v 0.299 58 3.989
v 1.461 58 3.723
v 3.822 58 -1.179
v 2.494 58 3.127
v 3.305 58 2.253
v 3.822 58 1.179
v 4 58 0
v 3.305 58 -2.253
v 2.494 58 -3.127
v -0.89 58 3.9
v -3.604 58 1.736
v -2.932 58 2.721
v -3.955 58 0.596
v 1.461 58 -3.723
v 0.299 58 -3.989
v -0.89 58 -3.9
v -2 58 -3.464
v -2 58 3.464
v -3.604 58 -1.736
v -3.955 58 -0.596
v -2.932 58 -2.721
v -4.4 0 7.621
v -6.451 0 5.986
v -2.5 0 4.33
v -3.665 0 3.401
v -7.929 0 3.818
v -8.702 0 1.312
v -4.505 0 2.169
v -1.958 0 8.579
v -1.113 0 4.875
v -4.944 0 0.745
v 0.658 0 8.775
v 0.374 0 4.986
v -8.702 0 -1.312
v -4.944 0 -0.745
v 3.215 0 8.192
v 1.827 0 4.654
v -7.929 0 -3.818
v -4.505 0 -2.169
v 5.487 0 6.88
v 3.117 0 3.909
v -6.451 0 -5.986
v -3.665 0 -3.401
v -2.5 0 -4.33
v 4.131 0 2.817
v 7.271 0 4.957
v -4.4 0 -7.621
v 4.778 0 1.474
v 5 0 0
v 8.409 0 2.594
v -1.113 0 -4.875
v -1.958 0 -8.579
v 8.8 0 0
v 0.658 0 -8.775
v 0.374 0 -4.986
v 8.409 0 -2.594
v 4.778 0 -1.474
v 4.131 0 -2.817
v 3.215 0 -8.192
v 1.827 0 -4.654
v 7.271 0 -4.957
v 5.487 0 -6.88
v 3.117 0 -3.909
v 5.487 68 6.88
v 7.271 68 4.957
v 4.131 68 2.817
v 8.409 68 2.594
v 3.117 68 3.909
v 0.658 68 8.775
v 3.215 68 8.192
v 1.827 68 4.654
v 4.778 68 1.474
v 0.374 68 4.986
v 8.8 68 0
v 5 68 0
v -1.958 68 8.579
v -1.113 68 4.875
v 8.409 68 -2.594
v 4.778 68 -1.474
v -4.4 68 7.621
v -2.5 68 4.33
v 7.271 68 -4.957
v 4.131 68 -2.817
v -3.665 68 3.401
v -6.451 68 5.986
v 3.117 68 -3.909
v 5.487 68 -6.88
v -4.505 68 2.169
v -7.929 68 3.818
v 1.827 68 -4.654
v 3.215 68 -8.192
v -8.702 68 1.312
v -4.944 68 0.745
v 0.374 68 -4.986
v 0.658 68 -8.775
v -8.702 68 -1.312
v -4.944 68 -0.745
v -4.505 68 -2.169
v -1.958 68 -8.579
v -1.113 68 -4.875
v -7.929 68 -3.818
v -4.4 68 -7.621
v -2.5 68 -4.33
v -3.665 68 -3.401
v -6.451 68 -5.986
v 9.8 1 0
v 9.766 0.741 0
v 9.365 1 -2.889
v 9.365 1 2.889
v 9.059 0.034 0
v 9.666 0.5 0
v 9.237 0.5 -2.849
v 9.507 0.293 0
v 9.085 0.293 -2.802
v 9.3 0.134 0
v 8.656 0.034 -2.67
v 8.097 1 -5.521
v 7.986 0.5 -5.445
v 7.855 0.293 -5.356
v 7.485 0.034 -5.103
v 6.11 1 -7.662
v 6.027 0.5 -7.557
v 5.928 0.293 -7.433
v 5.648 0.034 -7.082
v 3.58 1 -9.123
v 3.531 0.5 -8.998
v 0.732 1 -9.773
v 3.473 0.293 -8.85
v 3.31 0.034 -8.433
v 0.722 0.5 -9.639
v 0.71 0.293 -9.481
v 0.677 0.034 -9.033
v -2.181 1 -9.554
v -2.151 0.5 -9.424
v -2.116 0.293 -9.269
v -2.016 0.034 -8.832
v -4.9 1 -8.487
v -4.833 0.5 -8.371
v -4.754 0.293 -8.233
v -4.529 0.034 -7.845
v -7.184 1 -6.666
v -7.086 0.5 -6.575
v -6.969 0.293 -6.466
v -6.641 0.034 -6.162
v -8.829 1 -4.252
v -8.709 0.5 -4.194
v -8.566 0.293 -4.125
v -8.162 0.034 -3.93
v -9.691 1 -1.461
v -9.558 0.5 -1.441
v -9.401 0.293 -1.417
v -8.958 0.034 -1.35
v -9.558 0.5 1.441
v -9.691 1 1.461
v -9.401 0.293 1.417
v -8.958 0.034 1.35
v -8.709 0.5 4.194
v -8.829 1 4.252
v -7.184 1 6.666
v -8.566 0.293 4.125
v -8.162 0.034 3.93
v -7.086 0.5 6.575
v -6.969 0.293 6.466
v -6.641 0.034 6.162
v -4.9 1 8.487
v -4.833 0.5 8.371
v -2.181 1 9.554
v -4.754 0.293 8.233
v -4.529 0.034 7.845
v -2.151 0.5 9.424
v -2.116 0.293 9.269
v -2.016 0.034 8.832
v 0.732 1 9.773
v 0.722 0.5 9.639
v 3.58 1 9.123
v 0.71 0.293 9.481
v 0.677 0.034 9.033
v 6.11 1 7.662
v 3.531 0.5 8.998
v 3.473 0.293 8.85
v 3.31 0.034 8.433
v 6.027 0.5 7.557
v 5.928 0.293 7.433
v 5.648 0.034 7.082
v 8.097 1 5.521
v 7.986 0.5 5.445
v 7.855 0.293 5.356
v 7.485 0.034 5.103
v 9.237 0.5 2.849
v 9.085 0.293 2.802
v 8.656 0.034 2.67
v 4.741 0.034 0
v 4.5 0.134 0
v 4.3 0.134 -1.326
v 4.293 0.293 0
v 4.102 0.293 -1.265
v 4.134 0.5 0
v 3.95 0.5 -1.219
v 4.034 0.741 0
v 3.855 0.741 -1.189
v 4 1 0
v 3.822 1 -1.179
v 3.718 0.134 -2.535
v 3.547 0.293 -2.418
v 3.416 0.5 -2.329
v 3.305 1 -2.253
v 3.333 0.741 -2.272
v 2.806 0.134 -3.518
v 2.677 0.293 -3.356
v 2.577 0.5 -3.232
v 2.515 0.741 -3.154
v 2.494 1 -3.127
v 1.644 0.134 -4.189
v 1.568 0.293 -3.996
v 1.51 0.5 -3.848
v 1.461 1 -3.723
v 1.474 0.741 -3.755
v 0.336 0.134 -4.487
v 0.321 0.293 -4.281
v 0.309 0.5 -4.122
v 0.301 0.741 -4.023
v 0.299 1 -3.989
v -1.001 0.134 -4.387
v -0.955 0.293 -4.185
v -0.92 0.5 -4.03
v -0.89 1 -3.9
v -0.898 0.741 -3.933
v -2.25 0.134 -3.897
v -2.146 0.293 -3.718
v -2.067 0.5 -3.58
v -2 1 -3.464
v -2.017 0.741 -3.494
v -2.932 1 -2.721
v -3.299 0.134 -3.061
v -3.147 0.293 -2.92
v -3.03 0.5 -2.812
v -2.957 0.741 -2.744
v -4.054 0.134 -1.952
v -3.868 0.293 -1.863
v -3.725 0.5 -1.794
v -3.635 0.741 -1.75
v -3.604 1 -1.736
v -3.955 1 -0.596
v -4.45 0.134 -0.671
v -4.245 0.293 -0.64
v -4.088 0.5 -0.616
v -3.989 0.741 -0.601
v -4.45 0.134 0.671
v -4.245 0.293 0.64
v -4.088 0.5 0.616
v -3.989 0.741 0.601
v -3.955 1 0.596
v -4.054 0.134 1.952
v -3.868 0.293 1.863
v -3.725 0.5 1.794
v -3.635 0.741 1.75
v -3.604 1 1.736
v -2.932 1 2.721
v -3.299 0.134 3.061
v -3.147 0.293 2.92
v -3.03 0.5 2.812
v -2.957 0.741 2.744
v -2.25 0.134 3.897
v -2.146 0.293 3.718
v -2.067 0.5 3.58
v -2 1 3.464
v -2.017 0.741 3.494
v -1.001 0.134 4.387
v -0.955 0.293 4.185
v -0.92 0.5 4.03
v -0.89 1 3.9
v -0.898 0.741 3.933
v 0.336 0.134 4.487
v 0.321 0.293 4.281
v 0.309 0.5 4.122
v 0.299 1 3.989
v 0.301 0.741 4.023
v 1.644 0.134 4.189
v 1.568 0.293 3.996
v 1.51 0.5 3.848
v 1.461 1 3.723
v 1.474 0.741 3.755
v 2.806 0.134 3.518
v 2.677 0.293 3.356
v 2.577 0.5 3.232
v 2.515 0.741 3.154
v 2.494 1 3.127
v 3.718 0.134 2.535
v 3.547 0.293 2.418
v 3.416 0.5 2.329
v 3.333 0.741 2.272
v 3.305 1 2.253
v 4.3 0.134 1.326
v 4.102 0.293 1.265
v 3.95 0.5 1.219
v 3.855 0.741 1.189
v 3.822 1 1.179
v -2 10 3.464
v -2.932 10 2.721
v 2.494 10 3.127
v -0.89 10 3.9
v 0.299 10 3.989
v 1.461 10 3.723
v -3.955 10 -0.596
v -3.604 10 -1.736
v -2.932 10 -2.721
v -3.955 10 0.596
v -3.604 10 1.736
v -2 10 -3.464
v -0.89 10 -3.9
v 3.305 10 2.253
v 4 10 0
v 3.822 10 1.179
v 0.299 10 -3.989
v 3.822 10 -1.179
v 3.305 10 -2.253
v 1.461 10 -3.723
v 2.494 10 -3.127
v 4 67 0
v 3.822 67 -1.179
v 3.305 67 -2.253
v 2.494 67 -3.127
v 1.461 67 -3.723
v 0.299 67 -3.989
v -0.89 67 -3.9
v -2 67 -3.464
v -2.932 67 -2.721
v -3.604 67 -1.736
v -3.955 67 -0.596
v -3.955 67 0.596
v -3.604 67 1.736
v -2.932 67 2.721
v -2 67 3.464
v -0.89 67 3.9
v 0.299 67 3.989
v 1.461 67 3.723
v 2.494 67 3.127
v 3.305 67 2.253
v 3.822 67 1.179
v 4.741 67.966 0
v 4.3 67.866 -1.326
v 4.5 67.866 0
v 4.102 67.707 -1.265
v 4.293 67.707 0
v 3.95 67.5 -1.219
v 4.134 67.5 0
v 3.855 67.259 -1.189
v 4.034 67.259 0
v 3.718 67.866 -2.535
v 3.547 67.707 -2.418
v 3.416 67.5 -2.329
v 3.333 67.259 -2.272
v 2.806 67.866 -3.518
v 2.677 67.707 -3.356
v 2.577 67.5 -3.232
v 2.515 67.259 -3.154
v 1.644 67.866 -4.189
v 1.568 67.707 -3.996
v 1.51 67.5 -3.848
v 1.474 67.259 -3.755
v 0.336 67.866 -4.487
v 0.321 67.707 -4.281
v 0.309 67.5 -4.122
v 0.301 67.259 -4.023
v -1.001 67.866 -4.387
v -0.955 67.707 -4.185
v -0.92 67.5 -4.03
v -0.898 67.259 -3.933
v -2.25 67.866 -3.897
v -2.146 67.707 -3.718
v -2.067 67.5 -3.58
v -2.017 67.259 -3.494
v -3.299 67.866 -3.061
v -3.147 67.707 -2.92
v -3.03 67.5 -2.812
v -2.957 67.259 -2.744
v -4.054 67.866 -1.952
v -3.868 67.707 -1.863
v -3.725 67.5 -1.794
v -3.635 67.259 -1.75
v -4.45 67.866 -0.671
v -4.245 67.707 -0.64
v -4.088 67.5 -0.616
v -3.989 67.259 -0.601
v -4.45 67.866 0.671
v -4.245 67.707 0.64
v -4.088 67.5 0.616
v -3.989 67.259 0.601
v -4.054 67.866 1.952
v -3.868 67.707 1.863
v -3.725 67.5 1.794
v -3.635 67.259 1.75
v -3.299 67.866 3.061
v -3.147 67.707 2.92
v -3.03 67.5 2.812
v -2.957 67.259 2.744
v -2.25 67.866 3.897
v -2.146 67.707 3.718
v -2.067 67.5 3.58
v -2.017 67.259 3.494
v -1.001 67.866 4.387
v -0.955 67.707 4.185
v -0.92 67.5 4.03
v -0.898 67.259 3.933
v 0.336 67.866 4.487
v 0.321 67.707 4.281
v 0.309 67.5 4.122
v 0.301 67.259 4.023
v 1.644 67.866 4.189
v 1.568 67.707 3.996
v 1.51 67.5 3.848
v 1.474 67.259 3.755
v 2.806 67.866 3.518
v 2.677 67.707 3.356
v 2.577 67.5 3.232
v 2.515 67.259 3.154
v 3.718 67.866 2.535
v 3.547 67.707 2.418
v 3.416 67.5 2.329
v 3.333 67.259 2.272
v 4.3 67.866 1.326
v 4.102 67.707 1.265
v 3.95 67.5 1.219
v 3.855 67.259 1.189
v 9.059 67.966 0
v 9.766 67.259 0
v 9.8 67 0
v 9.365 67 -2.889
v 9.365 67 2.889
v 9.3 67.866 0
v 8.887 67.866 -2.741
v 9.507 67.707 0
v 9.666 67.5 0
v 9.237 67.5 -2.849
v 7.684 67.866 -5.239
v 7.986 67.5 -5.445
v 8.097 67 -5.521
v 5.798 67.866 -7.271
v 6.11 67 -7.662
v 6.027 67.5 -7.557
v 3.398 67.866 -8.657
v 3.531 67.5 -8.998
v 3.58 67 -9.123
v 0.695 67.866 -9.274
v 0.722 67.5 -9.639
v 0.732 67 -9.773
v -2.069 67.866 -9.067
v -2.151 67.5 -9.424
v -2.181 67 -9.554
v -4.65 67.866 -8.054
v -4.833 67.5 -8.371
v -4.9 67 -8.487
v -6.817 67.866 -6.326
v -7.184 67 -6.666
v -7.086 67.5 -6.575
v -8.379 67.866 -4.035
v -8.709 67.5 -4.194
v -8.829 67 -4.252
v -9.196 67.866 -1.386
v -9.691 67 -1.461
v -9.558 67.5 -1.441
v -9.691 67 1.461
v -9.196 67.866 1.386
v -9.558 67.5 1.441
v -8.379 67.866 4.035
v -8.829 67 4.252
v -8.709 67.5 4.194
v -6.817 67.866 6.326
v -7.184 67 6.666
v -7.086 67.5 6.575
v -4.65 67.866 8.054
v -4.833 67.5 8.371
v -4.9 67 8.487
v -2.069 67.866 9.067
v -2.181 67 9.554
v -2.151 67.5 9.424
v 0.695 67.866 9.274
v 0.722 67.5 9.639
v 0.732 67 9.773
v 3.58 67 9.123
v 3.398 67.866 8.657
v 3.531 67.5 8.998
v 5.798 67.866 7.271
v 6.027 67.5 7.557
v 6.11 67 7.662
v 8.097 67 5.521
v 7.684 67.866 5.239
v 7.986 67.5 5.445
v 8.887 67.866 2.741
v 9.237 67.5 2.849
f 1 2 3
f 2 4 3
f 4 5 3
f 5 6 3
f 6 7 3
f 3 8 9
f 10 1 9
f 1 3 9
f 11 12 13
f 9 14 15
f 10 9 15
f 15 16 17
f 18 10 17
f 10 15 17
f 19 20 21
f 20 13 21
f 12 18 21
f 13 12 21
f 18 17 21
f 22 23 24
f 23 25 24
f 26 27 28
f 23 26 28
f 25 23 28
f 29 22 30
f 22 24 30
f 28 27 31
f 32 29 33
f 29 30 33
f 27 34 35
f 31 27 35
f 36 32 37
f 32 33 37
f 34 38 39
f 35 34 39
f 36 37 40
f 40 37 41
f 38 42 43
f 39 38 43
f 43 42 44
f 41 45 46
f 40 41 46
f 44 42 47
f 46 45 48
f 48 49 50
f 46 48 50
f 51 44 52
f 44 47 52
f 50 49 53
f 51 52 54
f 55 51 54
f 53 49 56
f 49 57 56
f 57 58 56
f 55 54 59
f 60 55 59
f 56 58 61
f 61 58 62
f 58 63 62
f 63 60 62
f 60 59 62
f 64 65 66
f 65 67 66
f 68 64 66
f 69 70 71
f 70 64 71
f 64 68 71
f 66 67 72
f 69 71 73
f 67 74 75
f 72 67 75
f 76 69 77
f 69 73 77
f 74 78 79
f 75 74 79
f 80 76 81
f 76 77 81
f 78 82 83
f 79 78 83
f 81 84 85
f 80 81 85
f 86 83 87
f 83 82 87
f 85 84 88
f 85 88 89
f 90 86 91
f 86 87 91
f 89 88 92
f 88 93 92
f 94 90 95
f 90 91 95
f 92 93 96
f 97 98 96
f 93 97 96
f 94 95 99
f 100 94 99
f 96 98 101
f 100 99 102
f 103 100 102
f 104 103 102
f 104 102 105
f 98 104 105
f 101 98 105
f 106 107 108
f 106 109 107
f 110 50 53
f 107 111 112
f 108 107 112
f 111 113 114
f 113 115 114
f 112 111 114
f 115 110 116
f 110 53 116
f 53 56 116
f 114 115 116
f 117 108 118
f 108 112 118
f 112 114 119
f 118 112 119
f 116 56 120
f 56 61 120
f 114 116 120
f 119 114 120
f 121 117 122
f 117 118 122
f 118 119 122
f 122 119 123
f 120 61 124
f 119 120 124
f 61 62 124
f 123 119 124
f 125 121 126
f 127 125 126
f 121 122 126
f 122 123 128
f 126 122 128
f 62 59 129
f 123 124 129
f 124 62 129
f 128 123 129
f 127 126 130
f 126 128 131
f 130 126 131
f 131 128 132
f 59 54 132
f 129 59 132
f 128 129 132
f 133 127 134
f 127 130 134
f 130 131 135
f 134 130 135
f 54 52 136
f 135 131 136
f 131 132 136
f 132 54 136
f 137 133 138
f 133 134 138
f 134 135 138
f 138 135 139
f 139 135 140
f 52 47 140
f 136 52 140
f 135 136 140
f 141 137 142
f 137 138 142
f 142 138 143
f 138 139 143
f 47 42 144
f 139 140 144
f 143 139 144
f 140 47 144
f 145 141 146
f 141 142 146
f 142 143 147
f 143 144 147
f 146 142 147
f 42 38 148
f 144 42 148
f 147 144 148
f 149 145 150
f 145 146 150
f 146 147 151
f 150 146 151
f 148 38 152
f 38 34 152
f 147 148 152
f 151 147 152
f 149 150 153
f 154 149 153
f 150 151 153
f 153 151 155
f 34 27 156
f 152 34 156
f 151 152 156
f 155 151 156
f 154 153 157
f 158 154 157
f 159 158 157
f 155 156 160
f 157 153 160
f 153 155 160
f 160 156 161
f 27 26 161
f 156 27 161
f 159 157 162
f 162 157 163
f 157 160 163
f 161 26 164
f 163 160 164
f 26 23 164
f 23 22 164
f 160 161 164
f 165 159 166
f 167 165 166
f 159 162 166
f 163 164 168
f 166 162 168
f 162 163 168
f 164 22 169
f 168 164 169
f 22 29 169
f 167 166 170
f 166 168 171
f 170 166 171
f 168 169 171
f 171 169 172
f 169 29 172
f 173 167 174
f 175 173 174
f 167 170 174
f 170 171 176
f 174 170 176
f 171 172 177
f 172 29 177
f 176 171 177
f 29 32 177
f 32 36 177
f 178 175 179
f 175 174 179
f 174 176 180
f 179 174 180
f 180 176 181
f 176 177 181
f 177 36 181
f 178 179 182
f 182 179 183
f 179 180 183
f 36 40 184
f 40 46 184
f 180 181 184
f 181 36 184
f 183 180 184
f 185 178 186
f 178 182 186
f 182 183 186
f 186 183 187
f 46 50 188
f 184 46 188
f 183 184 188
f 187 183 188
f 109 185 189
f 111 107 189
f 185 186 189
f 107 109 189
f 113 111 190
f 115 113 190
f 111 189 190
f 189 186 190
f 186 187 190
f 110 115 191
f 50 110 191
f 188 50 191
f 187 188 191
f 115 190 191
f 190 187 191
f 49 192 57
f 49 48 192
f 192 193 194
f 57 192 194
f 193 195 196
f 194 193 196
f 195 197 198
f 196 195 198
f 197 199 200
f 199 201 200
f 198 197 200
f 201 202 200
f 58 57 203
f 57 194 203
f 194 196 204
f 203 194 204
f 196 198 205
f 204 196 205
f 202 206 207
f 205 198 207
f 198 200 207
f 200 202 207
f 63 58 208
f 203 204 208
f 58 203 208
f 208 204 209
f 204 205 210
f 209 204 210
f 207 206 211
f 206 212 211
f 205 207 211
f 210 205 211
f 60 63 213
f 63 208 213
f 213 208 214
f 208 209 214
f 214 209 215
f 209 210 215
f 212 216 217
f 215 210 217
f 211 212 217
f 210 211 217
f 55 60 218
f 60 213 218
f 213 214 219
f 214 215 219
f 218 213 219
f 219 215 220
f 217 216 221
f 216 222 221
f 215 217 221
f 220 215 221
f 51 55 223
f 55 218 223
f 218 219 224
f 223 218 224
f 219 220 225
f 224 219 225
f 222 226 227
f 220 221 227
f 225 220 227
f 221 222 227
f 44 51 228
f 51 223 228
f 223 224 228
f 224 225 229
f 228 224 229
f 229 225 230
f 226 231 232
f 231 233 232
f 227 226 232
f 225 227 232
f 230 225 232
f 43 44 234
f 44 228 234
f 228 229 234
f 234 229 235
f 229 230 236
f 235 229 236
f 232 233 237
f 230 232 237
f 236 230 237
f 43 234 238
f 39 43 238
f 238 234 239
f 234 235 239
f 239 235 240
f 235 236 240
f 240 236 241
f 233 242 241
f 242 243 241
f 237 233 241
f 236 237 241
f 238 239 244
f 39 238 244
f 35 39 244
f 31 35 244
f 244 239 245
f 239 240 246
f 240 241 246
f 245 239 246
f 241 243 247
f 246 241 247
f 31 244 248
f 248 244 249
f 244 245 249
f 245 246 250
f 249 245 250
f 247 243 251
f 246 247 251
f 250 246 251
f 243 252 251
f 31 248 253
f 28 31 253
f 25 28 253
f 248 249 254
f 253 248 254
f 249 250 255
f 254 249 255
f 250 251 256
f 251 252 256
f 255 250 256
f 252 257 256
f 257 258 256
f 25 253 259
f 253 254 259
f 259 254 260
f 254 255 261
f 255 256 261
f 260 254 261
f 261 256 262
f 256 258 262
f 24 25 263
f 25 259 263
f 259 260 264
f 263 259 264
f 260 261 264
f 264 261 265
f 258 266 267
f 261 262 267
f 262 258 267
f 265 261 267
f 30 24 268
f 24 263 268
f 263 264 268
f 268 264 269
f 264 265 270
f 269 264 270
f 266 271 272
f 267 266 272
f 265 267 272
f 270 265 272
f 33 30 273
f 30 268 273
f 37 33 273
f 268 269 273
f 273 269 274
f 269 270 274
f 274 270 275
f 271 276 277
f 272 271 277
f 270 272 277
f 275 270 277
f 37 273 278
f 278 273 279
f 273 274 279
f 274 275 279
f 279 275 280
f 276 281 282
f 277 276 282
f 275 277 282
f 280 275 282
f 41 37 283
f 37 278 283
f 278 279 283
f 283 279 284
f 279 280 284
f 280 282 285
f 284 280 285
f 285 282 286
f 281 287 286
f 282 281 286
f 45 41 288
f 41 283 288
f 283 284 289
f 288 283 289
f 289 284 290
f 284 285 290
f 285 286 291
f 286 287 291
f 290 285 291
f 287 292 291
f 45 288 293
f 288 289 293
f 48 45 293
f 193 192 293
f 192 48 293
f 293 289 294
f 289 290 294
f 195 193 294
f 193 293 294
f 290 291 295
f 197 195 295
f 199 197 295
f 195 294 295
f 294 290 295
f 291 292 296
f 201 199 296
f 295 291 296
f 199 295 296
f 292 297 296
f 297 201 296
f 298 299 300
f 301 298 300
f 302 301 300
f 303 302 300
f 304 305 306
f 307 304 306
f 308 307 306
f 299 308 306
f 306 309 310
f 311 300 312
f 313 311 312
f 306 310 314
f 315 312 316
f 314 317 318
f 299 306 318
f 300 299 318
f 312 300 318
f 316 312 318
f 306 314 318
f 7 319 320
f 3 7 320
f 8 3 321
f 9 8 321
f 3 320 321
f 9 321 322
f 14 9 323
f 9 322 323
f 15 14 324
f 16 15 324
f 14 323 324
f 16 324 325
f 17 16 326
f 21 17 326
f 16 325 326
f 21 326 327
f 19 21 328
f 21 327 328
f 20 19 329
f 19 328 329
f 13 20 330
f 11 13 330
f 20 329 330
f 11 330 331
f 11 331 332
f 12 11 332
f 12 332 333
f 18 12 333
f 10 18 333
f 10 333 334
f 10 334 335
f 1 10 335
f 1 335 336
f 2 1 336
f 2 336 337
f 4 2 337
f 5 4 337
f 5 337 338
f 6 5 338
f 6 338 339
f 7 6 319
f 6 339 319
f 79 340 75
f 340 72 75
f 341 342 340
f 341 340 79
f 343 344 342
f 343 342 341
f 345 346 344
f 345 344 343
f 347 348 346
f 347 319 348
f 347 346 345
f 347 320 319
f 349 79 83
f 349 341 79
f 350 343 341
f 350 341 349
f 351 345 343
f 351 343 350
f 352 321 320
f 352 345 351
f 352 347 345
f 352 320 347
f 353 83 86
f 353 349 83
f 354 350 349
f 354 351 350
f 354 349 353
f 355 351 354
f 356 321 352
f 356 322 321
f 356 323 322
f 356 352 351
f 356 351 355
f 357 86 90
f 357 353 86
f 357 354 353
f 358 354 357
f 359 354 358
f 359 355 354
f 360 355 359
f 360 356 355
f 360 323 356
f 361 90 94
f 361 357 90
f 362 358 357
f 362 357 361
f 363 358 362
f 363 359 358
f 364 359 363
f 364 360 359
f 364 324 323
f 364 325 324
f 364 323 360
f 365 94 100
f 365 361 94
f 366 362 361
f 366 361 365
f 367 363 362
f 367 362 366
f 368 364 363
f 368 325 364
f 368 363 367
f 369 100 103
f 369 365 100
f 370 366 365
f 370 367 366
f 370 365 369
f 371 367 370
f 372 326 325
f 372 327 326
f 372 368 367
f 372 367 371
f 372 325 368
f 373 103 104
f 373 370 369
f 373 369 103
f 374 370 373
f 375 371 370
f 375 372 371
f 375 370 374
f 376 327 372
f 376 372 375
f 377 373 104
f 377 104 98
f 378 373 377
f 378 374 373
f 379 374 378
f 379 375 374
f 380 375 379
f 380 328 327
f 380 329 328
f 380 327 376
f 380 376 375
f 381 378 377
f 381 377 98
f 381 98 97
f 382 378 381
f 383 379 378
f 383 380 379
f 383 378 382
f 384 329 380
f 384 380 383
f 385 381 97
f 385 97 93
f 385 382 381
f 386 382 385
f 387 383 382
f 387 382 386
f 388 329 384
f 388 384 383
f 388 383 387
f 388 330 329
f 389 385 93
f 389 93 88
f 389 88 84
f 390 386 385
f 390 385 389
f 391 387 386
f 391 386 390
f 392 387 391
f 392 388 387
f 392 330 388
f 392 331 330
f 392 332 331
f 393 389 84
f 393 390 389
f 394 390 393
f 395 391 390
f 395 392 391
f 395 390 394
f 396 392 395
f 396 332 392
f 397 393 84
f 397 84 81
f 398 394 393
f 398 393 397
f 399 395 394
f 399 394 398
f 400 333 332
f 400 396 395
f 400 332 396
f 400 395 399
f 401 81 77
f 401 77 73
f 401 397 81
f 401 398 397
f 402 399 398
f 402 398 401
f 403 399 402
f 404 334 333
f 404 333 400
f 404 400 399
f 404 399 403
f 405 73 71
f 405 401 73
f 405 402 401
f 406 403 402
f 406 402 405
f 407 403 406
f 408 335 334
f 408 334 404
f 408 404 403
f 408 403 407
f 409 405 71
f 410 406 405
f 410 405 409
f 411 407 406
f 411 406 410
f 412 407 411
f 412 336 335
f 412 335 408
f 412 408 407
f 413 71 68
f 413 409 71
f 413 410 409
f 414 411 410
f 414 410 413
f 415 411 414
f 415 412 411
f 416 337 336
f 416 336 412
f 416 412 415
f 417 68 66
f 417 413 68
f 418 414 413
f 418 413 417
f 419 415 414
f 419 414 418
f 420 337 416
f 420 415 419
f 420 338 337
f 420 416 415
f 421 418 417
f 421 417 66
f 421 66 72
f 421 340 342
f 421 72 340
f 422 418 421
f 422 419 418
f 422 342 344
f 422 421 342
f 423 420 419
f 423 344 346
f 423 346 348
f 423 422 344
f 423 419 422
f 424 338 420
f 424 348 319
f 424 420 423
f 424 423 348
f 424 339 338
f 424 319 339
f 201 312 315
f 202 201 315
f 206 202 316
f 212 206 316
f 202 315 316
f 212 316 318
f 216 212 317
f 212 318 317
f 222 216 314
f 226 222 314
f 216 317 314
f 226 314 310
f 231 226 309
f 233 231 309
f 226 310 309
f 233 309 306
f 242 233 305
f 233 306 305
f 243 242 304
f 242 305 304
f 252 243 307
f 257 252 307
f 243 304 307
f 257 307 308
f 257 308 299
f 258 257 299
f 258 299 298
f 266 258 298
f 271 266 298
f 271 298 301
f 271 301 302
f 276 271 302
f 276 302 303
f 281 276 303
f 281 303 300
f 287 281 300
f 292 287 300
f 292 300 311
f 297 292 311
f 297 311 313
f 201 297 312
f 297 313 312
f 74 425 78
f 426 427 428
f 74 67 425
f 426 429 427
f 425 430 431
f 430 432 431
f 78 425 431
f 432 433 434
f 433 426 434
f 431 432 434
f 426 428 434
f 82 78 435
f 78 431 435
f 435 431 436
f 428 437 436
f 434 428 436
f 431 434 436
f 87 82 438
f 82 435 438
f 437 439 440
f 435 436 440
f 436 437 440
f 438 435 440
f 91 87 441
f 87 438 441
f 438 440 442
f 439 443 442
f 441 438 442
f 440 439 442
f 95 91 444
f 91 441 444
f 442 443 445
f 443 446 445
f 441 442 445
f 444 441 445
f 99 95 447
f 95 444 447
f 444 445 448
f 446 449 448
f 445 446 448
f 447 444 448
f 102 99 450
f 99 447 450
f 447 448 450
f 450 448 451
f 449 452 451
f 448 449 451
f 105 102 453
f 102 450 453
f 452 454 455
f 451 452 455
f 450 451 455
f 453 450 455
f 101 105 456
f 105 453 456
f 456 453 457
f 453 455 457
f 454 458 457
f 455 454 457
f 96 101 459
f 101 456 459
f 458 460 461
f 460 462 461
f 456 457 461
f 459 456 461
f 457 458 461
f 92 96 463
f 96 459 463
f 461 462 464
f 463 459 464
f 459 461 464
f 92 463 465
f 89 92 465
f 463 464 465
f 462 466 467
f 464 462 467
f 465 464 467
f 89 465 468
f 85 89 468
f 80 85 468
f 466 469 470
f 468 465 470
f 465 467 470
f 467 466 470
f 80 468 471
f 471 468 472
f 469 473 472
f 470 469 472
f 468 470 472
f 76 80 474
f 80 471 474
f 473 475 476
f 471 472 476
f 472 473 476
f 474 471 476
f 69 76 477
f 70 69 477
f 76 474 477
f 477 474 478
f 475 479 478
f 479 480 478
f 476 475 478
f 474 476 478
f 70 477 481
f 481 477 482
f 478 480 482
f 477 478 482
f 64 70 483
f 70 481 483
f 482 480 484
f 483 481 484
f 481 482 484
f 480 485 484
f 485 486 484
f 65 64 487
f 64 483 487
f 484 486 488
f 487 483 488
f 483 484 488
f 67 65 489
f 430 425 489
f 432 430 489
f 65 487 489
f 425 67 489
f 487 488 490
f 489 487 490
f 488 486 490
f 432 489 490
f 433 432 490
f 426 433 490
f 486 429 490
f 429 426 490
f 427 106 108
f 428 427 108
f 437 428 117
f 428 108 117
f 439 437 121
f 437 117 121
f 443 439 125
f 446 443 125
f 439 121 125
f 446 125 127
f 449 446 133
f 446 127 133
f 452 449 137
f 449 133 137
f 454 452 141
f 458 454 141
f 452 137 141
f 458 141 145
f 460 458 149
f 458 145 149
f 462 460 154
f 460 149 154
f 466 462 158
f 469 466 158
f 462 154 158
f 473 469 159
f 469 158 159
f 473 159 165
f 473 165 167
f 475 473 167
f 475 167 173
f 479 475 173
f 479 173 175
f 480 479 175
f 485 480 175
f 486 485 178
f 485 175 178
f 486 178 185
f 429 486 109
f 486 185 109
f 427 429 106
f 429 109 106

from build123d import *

# Parameters (mm, degrees)
FILLET_R = 1


with BuildPart() as part:
    # Sketch → Revolution (revolve)
    with BuildSketch(Plane.XY):
        Polygon((4, 68), (9.8, 68), (9.8, 0), (4, 0), (4, 10), (0, 10), (0, 58), (4, 58), align=None)
    revolve(axis=Axis((0, 0, 0), (0, 1, 0)))

    # Fillet
    fillet_edges = [part.edges().sort_by_distance(p)[0] for p in [
        (-4, 0, 0),
        (-9.8, 0, 0),
        (-9.8, 68, 0),
        (-4, 68, 0),
    ]]
    fillet(fillet_edges, radius=FILLET_R)


solid = part.part
